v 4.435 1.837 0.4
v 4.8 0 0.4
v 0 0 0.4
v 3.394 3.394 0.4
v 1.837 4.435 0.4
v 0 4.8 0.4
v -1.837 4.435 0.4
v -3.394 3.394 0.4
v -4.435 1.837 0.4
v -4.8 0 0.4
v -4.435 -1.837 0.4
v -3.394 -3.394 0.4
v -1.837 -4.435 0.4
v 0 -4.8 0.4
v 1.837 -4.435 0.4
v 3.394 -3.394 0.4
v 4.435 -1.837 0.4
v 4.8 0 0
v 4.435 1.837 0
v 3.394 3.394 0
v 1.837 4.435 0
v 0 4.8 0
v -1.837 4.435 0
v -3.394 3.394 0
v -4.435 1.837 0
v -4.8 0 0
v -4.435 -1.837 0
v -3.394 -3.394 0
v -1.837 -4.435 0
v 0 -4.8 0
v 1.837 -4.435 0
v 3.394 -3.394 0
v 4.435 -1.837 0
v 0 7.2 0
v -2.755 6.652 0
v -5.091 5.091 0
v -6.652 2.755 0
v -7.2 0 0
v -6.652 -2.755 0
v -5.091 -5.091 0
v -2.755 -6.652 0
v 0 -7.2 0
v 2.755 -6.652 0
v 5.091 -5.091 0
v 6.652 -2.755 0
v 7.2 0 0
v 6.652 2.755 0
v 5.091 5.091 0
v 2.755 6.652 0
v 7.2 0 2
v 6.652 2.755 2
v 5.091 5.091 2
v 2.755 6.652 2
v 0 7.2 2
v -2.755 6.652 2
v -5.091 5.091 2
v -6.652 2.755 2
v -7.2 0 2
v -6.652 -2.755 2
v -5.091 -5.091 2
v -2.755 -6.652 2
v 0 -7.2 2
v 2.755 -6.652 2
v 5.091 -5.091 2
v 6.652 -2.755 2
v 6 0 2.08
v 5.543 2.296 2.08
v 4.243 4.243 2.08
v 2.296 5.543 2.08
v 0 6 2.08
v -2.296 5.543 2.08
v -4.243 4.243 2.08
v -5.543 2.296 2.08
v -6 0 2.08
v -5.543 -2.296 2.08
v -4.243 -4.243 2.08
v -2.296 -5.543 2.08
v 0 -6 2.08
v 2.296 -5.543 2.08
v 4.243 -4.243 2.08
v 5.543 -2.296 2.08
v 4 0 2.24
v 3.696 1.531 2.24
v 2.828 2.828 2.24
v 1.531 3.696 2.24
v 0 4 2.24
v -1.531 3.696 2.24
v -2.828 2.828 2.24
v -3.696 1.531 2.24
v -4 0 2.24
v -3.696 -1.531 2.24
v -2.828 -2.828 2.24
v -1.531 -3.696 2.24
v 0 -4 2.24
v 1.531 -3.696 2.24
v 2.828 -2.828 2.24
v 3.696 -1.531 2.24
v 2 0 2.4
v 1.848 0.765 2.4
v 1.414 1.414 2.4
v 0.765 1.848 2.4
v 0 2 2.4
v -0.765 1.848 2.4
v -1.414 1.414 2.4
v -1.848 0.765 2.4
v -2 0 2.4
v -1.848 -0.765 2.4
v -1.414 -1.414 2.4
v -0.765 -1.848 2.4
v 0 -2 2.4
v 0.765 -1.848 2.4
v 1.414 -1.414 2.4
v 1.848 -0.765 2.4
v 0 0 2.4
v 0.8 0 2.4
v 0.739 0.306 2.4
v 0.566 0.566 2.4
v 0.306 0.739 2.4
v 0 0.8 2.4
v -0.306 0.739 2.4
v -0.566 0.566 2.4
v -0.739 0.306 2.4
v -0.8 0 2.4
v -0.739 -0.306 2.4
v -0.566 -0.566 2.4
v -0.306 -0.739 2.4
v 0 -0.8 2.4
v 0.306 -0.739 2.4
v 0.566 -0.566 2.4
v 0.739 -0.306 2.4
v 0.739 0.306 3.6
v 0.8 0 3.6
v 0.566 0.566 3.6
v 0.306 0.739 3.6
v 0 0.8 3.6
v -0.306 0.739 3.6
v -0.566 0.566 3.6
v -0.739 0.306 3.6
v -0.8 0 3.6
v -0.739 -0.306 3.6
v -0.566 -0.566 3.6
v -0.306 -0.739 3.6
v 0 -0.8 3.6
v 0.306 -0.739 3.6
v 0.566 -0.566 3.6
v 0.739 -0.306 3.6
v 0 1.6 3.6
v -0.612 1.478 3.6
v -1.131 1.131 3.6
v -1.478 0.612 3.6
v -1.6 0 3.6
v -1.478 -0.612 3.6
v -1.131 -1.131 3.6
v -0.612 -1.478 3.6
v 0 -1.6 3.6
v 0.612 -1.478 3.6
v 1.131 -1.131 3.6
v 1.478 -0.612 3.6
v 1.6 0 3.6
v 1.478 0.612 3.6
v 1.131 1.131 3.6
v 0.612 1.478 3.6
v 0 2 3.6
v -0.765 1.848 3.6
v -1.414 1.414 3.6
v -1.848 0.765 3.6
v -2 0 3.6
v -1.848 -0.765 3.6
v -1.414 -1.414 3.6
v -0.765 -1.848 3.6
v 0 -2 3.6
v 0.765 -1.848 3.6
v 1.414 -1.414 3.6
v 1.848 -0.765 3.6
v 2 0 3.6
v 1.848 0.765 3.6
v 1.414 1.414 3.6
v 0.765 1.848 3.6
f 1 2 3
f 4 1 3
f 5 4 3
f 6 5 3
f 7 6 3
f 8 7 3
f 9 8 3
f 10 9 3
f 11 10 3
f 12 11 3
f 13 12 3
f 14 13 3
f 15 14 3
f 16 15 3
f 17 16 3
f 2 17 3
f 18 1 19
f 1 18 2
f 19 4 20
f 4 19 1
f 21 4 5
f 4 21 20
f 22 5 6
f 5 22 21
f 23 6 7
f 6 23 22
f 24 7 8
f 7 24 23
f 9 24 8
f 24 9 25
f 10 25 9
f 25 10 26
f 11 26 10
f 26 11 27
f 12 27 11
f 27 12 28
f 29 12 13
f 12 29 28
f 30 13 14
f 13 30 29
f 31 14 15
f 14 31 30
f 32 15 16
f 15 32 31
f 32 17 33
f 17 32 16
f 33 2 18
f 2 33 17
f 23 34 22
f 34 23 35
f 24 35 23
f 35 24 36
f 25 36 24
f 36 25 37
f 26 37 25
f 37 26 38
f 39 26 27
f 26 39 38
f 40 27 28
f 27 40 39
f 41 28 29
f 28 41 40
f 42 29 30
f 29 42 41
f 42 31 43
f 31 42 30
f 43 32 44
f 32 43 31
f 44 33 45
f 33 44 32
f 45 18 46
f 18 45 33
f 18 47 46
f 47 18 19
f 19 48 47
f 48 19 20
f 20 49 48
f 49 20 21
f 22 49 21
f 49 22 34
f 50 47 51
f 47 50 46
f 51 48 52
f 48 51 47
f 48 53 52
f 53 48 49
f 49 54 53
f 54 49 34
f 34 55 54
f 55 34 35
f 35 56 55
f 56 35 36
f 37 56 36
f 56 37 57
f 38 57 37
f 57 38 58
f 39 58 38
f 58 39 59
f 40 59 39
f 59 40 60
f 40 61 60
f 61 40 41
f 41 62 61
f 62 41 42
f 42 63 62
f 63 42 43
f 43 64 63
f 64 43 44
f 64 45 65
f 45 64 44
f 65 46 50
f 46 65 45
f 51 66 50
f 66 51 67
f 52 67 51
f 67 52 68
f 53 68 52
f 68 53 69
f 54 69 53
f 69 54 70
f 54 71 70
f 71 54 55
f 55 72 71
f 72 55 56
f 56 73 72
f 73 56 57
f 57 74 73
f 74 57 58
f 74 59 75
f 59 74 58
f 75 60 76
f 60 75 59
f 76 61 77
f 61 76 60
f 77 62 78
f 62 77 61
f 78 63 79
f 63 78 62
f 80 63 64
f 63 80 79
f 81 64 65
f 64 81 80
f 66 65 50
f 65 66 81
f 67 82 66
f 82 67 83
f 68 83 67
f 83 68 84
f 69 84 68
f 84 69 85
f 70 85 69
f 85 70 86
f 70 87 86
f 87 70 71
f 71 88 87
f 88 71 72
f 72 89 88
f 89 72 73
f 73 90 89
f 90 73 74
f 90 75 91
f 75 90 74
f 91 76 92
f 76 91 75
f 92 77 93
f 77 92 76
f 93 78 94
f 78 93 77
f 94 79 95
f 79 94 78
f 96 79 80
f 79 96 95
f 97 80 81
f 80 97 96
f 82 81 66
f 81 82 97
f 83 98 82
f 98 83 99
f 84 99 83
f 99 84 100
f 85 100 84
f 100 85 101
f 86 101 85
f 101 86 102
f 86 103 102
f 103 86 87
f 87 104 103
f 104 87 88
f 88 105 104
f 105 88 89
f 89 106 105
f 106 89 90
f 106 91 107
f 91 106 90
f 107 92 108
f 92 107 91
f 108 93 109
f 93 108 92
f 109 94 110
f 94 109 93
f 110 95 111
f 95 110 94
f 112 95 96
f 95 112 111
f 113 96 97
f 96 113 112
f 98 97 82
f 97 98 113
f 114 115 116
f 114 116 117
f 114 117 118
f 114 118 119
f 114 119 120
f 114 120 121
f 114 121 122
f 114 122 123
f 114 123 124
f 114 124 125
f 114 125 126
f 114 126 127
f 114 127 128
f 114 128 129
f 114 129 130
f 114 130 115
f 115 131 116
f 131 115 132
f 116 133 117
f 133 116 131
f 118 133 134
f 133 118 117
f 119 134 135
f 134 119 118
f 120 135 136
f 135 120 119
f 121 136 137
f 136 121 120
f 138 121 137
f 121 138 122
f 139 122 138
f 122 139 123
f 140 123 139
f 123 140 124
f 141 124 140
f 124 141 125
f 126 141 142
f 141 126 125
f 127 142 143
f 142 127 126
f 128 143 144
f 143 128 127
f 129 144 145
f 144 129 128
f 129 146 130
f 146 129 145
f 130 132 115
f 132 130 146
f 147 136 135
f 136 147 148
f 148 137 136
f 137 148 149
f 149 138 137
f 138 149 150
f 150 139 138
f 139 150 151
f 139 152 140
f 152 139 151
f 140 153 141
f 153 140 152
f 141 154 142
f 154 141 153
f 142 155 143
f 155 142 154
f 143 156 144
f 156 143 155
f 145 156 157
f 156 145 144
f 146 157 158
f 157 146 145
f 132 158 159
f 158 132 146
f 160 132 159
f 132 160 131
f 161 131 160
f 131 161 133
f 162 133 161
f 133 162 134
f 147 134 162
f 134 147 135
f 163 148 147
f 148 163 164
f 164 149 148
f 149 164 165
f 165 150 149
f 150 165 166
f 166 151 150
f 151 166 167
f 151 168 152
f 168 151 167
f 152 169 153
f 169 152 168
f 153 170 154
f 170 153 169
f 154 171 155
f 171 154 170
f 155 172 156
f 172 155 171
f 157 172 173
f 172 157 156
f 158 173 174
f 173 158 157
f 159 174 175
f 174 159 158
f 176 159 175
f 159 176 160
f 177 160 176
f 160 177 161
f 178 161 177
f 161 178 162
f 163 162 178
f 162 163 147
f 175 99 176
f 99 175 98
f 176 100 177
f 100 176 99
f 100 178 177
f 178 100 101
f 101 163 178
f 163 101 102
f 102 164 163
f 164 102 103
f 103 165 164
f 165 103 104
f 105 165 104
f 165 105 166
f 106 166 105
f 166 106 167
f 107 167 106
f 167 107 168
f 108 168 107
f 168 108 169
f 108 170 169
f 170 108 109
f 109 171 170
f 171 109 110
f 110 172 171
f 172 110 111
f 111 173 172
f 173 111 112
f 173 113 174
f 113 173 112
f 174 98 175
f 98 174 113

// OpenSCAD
use <../lib.scad>
use <../p/4-4con1.scad>
use <../p/4-4con2.scad>
use <../p/4-4con5.scad>
use <../p/4-4cylc.scad>
use <../p/4-4cyli.scad>
use <../p/4-4edge.scad>
use <../p/4-4ring1.scad>
use <../p/4-4ring2.scad>
use <../p/4-4ring4.scad>
$fa=1; $fs=0.2;
function ldraw_lib__746(realsolid=false) = [
// 0 Roadsign Base Round Type 2
// 0 Name: 746.dat
// 0 Author: Tore Eriksson [Tore_Eriksson]
// 0 !LDRAW_ORG Part UPDATE 2010-02
// 0 !LICENSE Licensed under CC BY 2.0 and CC BY 4.0 : see CAreadme.txt
// 
// 0 BFC CERTIFY CCW
  [0,"BFC","CERTIFY"],
  [0,"BFC","CCW"],
// 
// 0 !CMDLINE -c7
// 
// 0 !HISTORY 2000-09-30 [PTadmin] Official Update 2000-02
// 0 !HISTORY 2007-07-22 [PTadmin] Header formatted for Contributor Agreement
// 0 !HISTORY 2008-07-01 [PTadmin] Official Update 2008-01
// 0 !HISTORY 2009-07-06 [tchang] Add BFC, primitives
// 0 !HISTORY 2010-07-05 [PTadmin] Official Update 2010-02
// 
// 
// 0 BFC INVERTNEXT
  [0,"BFC","INVERTNEXT"],
// 1 16 0 -1 0 12 0 0 0 1 0 0 0 12 4-4cylc.dat
  [1,16,0,-1,0,12,0,0,0,1,0,0,0,12, ldraw_lib__4_4cylc(realsolid)],
// 1 16 0 0 0 6 0 0 0 -1 0 0 0 6 4-4ring2.dat
  [1,16,0,0,0,6,0,0,0,-1,0,0,0,6, ldraw_lib__4_4ring2(realsolid)],
// 1 16 0 0 0 18 0 0 0 1 0 0 0 18 4-4edge.dat
  [1,16,0,0,0,18,0,0,0,1,0,0,0,18, ldraw_lib__4_4edge(realsolid)],
// 1 16 0 -5 0 18 0 0 0 5 0 0 0 18 4-4cyli.dat
  [1,16,0,-5,0,18,0,0,0,5,0,0,0,18, ldraw_lib__4_4cyli(realsolid)],
// 1 16 0 -5 0 18 0 0 0 1 0 0 0 18 4-4edge.dat
  [1,16,0,-5,0,18,0,0,0,1,0,0,0,18, ldraw_lib__4_4edge(realsolid)],
// 0 //
// 1 16 0 -5 0 3 0 0 0 -0.2 0 0 0 3 4-4con5.dat
  [1,16,0,-5,0,3,0,0,0,-0.2,0,0,0,3, ldraw_lib__4_4con5(realsolid)],
// 1 16 0 -5.2 0 5 0 0 0 -0.4 0 0 0 5 4-4con2.dat
  [1,16,0,-5.2,0,5,0,0,0,-0.4,0,0,0,5, ldraw_lib__4_4con2(realsolid)],
// 1 16 0 -5.6 0 5 0 0 0 -0.4 0 0 0 5 4-4con1.dat
  [1,16,0,-5.6,0,5,0,0,0,-0.4,0,0,0,5, ldraw_lib__4_4con1(realsolid)],
// 1 16 0 -6 0 5 0 0 0 1 0 0 0 5 4-4edge.dat
  [1,16,0,-6,0,5,0,0,0,1,0,0,0,5, ldraw_lib__4_4edge(realsolid)],
// 0 //
// 0 BFC INVERTNEXT
  [0,"BFC","INVERTNEXT"],
// 1 16 0 -6 0 2 0 0 0 -3 0 0 0 2 4-4cylc.dat
  [1,16,0,-6,0,2,0,0,0,-3,0,0,0,2, ldraw_lib__4_4cylc(realsolid)],
// 1 16 0 -9 0 2 0 0 0 1 0 0 0 2 4-4ring1.dat
  [1,16,0,-9,0,2,0,0,0,1,0,0,0,2, ldraw_lib__4_4ring1(realsolid)],
// 1 16 0 -9 0 1 0 0 0 1 0 0 0 1 4-4ring4.dat
  [1,16,0,-9,0,1,0,0,0,1,0,0,0,1, ldraw_lib__4_4ring4(realsolid)],
// 1 16 0 -9 0 5 0 0 0 1 0 0 0 5 4-4edge.dat
  [1,16,0,-9,0,5,0,0,0,1,0,0,0,5, ldraw_lib__4_4edge(realsolid)],
// 1 16 0 -9 0 5 0 0 0 3 0 0 0 5 4-4cyli.dat
  [1,16,0,-9,0,5,0,0,0,3,0,0,0,5, ldraw_lib__4_4cyli(realsolid)],
// 0 //
];
module ldraw_lib__746(step=0, col=false, unit=2/5, alt=false, line=0.2, solid=!$preview)
    makepoly(ldraw_lib__746(solid), step=step, col=col, unit=unit, alt=alt, line=line, solid=solid);
ldraw_lib__746(line=0.2);
